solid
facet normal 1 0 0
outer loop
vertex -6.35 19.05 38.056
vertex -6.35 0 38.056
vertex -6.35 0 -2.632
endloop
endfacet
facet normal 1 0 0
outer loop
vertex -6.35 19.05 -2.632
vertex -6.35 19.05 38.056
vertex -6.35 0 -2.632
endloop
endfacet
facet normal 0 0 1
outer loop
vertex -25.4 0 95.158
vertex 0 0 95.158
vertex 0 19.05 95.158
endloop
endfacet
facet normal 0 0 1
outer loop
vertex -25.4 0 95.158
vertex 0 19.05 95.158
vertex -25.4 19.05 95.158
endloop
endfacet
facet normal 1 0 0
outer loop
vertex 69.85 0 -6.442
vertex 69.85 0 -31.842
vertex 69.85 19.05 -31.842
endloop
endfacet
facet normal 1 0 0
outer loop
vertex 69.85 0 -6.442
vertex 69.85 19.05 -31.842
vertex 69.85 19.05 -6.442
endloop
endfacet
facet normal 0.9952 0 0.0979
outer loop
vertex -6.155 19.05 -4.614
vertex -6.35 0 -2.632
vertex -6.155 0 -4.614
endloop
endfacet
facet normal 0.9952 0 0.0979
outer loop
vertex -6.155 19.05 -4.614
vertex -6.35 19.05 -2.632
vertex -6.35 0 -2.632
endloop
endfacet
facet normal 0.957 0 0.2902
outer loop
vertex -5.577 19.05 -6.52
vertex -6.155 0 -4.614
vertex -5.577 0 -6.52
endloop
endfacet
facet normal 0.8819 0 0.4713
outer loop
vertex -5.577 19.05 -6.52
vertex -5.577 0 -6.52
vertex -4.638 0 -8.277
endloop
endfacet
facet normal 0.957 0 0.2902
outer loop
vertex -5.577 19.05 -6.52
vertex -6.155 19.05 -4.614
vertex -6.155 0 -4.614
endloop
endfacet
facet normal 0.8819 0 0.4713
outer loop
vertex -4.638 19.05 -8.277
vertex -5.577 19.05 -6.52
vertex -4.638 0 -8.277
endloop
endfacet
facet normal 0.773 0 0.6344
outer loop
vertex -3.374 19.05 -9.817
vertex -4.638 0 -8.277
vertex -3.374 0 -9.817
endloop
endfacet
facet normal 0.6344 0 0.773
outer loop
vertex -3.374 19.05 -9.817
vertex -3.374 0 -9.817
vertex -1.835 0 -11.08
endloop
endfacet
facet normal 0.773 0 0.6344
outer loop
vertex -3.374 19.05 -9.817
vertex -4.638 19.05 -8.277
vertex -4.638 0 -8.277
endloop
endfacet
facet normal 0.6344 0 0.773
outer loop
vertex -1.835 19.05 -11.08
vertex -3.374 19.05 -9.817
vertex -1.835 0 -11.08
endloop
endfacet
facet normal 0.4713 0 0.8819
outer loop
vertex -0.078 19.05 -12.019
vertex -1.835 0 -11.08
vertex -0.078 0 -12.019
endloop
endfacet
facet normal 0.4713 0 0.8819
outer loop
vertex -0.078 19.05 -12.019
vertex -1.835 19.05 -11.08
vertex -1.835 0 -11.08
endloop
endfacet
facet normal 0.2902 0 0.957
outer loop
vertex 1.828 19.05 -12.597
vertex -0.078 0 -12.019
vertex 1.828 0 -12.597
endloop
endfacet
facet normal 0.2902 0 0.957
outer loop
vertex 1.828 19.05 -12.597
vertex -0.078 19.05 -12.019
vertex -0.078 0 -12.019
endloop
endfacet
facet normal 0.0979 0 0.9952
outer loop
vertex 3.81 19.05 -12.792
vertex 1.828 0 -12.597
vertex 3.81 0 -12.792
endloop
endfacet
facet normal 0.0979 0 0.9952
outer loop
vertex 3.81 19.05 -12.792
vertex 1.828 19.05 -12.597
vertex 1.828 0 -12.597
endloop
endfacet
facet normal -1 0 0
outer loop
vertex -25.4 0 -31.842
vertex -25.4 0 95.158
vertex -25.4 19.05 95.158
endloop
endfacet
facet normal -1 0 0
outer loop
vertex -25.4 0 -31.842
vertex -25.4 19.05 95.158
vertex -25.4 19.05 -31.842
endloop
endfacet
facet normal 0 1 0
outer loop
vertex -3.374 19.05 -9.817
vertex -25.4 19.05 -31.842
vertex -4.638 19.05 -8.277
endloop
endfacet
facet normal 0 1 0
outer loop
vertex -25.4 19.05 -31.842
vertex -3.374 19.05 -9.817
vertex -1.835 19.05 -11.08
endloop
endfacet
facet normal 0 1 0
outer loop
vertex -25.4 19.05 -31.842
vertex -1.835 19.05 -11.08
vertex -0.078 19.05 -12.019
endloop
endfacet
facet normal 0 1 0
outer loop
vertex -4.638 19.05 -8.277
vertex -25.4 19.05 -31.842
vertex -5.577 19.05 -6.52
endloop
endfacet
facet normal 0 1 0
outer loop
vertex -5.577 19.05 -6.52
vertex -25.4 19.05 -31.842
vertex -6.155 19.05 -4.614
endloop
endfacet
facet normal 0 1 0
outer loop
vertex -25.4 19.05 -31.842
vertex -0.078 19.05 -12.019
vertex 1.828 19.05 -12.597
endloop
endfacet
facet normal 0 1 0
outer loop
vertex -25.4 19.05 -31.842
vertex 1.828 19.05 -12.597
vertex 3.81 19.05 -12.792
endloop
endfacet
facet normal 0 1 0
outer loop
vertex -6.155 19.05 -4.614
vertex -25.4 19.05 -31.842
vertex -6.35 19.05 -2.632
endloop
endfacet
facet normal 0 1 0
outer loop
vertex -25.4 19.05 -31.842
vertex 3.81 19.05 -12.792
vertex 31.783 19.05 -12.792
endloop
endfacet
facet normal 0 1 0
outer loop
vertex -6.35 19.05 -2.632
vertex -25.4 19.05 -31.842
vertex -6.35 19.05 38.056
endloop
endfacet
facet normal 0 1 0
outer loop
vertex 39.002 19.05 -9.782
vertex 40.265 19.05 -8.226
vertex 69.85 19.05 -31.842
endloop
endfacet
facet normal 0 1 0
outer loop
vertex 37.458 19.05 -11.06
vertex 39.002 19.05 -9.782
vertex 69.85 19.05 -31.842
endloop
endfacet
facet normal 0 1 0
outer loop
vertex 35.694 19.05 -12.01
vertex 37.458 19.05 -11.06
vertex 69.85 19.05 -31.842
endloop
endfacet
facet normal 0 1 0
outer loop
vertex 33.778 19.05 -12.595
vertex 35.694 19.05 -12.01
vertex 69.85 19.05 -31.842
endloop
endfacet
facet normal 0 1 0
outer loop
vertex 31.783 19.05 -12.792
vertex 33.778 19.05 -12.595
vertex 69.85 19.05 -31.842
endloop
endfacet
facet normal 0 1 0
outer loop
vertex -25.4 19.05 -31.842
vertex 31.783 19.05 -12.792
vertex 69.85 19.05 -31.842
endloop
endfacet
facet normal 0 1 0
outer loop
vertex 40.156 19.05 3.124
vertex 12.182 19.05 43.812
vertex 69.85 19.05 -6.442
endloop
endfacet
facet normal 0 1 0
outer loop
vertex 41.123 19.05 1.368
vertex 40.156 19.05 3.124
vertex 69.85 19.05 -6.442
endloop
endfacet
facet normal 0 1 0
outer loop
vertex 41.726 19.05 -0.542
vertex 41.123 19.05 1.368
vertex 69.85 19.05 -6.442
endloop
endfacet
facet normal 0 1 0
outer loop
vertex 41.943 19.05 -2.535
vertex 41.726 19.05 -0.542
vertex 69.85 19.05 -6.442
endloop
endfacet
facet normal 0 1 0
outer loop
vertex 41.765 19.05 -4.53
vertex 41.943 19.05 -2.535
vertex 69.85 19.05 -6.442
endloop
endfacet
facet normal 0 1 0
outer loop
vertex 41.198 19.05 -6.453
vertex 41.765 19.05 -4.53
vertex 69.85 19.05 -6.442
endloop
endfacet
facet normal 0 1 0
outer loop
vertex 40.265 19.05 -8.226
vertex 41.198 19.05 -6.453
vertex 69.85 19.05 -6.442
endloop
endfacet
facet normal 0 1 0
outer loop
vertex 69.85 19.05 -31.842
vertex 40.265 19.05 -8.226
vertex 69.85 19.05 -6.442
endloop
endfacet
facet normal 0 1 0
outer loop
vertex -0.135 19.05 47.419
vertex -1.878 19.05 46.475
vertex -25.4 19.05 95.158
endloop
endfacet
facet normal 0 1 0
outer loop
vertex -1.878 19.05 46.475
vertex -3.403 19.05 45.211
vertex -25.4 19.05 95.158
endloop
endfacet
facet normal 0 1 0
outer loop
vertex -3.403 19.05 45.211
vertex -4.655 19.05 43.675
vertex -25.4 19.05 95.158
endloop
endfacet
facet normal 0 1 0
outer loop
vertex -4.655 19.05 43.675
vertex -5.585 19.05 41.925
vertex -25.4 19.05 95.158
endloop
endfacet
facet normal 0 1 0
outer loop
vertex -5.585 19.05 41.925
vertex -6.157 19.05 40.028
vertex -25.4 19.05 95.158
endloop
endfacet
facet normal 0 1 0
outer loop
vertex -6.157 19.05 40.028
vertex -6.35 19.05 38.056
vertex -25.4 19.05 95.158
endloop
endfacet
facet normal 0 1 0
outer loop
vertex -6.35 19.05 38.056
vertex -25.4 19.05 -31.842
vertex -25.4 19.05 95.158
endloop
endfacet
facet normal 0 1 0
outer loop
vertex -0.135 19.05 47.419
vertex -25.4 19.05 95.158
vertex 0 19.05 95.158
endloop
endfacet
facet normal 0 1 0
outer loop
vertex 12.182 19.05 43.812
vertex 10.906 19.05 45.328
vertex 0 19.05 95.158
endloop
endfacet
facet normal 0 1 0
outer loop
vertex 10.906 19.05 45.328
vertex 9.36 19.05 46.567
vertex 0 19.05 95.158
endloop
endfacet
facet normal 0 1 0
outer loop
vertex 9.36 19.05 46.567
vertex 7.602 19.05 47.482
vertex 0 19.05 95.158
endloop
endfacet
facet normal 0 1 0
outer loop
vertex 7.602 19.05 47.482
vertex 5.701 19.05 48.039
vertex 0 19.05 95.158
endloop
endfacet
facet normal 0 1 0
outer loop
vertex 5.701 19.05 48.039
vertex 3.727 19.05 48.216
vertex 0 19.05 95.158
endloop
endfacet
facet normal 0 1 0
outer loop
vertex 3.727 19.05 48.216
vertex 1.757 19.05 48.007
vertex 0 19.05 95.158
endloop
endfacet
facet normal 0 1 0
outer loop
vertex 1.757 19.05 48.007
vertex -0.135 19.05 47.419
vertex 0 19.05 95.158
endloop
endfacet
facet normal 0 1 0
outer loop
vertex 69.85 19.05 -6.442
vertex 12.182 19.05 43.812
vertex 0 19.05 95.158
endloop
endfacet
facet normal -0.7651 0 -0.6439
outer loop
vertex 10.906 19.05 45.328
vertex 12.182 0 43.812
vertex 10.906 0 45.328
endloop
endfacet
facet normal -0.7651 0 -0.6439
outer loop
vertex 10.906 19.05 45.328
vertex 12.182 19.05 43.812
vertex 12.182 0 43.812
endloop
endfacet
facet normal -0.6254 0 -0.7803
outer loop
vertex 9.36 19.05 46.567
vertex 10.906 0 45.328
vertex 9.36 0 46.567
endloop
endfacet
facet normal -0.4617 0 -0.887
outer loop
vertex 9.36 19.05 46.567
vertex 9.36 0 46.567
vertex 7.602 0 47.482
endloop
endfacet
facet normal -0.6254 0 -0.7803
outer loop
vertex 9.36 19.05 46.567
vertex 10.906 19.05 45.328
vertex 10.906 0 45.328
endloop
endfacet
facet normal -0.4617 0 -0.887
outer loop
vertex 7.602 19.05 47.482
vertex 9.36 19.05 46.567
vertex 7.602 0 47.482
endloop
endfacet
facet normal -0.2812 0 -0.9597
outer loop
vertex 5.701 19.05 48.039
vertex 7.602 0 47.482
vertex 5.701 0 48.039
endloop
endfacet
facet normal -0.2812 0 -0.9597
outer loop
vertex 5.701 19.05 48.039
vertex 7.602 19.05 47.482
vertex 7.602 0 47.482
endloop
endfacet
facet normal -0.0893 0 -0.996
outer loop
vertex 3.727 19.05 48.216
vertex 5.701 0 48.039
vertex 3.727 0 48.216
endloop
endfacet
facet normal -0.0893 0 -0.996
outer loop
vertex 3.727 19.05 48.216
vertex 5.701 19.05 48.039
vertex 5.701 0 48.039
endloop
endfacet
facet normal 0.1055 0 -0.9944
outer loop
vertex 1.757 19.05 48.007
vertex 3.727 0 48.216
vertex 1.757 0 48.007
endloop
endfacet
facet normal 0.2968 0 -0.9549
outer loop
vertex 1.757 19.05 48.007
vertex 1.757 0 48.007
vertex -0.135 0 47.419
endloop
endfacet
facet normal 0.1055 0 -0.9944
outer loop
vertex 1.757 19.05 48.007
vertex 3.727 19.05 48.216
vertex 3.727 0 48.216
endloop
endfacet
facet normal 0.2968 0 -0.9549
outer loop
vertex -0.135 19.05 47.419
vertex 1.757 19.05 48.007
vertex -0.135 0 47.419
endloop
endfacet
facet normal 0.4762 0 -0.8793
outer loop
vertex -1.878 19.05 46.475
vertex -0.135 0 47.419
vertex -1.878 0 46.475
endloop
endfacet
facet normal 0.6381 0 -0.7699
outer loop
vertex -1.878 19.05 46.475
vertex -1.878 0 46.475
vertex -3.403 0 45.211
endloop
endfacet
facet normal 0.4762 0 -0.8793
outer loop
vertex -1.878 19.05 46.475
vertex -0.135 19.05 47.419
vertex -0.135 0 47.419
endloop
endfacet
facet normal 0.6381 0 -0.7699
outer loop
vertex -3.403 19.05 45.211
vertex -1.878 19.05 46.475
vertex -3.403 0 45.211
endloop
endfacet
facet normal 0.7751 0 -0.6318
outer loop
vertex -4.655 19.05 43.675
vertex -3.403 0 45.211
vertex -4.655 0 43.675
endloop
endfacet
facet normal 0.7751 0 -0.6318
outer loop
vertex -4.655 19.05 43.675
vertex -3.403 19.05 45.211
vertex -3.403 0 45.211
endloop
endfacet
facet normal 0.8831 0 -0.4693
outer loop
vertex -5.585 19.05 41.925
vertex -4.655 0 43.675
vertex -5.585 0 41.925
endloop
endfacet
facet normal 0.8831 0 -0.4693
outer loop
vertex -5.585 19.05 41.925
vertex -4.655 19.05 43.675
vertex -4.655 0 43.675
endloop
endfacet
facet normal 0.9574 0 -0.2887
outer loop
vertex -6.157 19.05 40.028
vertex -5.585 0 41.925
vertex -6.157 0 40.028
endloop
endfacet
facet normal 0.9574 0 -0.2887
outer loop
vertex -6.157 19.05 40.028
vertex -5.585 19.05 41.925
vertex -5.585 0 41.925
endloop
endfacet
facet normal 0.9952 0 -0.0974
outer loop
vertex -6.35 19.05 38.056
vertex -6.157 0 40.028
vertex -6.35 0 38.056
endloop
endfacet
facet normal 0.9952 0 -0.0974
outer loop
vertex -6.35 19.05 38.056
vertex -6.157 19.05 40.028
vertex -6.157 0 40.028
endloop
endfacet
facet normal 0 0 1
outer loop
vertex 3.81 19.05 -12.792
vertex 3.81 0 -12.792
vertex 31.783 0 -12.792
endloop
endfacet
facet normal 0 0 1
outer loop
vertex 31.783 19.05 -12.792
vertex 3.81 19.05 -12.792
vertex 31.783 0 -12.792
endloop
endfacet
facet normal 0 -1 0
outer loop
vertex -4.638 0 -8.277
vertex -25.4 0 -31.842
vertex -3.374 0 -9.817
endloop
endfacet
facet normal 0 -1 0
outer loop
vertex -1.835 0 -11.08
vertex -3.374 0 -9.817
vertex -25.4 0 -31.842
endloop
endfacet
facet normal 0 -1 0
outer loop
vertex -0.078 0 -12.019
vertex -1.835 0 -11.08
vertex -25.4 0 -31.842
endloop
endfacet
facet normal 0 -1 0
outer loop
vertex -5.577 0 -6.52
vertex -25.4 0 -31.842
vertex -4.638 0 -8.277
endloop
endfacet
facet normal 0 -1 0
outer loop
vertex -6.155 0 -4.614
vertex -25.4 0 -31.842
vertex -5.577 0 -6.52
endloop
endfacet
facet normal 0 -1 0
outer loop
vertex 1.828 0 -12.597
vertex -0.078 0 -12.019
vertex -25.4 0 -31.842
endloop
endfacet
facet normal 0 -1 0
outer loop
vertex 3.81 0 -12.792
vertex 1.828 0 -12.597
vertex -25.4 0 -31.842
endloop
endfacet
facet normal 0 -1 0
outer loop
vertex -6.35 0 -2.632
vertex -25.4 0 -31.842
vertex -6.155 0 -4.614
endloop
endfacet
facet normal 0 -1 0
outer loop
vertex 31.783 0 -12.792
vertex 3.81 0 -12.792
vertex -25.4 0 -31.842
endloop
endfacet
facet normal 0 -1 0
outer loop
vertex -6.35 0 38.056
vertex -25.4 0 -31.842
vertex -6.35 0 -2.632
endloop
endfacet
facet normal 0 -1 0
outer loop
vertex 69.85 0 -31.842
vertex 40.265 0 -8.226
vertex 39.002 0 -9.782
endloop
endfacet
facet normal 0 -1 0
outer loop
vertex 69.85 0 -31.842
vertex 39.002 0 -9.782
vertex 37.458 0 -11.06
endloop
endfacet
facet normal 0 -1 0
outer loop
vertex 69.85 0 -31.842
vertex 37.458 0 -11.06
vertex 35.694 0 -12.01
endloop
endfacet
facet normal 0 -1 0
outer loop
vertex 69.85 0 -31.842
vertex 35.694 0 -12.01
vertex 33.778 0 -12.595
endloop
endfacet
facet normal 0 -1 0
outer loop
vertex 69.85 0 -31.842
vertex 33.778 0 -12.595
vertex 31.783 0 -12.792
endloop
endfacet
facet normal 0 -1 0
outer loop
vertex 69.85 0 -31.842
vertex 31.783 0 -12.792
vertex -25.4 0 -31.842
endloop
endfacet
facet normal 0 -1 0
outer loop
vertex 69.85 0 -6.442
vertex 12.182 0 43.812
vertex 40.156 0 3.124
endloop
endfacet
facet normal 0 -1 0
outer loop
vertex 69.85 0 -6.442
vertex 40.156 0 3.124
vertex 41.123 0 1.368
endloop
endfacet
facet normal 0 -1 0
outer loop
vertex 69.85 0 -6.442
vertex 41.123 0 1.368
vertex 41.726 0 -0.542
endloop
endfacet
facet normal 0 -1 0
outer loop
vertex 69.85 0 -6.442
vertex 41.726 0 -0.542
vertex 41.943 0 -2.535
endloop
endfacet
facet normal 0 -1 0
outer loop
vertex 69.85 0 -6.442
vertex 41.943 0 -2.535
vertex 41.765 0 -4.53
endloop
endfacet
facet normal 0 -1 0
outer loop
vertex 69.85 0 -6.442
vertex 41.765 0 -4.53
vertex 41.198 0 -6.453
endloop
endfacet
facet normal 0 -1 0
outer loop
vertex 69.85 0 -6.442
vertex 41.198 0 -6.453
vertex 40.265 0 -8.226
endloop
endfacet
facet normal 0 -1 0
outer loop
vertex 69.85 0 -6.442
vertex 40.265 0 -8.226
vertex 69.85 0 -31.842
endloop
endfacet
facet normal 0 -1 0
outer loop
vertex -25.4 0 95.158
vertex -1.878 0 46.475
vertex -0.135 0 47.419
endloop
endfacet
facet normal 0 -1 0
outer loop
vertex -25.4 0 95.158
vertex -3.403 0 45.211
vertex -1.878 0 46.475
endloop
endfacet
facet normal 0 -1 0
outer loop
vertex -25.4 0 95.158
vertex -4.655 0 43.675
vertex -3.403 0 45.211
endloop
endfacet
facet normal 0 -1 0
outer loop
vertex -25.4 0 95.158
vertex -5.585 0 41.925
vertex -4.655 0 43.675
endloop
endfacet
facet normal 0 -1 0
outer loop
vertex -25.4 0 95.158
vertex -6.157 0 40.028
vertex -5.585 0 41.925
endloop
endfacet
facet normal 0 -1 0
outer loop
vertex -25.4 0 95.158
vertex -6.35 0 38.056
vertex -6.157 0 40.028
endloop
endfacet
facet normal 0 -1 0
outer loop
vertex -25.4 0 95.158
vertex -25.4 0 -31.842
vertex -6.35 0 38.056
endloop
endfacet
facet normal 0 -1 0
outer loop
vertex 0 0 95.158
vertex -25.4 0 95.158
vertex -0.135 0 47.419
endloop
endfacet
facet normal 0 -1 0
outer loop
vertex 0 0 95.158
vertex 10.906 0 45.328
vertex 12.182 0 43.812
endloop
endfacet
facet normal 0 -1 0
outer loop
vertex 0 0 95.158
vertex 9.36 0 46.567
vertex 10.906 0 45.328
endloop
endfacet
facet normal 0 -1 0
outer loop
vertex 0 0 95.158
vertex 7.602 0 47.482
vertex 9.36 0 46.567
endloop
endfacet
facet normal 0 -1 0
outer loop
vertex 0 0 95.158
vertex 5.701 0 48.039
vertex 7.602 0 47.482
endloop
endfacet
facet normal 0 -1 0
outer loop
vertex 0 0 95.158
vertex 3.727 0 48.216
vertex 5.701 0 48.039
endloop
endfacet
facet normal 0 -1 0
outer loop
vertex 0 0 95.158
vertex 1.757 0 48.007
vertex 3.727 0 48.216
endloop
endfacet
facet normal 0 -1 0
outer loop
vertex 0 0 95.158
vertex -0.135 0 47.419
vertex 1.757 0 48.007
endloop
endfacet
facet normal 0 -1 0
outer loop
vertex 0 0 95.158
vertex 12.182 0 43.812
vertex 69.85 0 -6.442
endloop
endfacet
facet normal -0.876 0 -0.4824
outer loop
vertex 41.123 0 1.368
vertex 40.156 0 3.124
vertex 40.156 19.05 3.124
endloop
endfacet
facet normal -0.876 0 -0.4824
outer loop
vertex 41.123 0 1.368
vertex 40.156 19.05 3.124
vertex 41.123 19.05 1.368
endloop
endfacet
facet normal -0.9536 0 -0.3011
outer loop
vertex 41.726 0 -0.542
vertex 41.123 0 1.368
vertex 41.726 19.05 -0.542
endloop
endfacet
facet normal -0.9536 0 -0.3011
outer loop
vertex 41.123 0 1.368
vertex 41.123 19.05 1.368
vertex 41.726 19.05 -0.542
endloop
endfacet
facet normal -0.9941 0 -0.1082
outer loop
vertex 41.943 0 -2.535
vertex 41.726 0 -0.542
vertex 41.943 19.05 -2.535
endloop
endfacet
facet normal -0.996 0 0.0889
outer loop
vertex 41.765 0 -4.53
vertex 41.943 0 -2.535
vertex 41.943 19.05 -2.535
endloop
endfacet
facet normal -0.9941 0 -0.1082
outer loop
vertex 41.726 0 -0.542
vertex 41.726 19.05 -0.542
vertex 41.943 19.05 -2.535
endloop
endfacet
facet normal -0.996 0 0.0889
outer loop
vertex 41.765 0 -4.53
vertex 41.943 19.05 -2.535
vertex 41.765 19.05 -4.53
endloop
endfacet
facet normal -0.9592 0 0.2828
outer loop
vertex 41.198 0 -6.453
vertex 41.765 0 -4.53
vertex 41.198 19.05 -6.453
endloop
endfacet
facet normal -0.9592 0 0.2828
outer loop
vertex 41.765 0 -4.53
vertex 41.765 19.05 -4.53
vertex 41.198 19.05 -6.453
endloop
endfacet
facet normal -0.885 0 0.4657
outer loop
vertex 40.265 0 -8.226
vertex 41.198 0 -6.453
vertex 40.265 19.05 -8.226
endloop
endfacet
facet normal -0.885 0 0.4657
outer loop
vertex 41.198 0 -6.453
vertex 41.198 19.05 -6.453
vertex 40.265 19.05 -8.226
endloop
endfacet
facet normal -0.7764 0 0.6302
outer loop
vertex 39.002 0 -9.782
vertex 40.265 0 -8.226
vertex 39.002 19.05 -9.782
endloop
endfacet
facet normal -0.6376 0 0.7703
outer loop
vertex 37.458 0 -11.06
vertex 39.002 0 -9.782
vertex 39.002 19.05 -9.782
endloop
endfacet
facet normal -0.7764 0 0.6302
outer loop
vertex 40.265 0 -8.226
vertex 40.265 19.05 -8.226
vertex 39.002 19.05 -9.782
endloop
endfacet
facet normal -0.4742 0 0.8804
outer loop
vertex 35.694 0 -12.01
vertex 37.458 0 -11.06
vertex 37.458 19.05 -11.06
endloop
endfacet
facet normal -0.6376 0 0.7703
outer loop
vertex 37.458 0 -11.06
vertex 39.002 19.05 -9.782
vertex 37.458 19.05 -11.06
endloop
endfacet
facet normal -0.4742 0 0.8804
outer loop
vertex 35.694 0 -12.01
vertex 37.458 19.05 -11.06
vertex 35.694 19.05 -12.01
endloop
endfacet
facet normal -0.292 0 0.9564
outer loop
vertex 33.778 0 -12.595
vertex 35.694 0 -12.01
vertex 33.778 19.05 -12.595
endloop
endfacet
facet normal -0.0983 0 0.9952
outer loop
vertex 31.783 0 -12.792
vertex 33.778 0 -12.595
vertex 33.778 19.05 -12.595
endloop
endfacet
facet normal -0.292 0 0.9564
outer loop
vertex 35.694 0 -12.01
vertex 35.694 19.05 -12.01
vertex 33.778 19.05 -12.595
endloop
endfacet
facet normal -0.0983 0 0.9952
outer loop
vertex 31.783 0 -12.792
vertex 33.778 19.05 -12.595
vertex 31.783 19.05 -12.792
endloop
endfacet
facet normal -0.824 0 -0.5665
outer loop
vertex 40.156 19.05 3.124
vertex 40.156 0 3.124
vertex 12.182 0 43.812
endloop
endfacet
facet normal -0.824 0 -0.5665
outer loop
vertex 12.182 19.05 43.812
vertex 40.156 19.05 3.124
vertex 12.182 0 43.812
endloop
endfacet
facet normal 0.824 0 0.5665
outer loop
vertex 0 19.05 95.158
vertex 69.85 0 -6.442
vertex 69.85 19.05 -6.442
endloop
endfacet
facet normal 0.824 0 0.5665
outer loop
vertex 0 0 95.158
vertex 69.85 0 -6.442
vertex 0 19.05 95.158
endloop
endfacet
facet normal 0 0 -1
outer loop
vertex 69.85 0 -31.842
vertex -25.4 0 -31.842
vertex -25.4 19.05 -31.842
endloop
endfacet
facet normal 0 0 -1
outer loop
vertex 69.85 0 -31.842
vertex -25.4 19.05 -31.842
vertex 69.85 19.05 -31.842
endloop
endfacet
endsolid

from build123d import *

# Parameters (mm, degrees)
F2_DEPTH = 19.05
F3_DEPTH = 19.051
F4_R     = 10.16
F5_R     = 10.16


with BuildPart() as f2:
    # F0 (on Front) → F2 (new body)
    with BuildSketch(Plane.XZ):
        Polygon((0, 95.157677), (-25.4, 95.157677), (-25.4, -31.842323), (69.85, -31.842323), (69.85, -6.442323), align=None)
    extrude(amount=-F2_DEPTH)

    # F1 (on face) → F3 (cut, through all)
    with BuildSketch(Plane.XZ):
        Polygon((51.097869, -12.792323), (-6.35, 70.768214), (-6.35, -12.792323), align=None)
    extrude(amount=-F3_DEPTH, mode=Mode.SUBTRACT)

    # F4
    f4_edges = [f2.edges().sort_by_distance(p)[0] for p in [
        (-6.35, 9.525, -12.792323),
        (51.097869, 9.525, -12.792323),
    ]]
    fillet(f4_edges, radius=F4_R)

    # F5
    f5_edges = [f2.edges().sort_by_distance(p)[0] for p in [
        (-6.35, 9.525, 70.768214),
    ]]
    fillet(f5_edges, radius=F5_R)


solid = f2.part
